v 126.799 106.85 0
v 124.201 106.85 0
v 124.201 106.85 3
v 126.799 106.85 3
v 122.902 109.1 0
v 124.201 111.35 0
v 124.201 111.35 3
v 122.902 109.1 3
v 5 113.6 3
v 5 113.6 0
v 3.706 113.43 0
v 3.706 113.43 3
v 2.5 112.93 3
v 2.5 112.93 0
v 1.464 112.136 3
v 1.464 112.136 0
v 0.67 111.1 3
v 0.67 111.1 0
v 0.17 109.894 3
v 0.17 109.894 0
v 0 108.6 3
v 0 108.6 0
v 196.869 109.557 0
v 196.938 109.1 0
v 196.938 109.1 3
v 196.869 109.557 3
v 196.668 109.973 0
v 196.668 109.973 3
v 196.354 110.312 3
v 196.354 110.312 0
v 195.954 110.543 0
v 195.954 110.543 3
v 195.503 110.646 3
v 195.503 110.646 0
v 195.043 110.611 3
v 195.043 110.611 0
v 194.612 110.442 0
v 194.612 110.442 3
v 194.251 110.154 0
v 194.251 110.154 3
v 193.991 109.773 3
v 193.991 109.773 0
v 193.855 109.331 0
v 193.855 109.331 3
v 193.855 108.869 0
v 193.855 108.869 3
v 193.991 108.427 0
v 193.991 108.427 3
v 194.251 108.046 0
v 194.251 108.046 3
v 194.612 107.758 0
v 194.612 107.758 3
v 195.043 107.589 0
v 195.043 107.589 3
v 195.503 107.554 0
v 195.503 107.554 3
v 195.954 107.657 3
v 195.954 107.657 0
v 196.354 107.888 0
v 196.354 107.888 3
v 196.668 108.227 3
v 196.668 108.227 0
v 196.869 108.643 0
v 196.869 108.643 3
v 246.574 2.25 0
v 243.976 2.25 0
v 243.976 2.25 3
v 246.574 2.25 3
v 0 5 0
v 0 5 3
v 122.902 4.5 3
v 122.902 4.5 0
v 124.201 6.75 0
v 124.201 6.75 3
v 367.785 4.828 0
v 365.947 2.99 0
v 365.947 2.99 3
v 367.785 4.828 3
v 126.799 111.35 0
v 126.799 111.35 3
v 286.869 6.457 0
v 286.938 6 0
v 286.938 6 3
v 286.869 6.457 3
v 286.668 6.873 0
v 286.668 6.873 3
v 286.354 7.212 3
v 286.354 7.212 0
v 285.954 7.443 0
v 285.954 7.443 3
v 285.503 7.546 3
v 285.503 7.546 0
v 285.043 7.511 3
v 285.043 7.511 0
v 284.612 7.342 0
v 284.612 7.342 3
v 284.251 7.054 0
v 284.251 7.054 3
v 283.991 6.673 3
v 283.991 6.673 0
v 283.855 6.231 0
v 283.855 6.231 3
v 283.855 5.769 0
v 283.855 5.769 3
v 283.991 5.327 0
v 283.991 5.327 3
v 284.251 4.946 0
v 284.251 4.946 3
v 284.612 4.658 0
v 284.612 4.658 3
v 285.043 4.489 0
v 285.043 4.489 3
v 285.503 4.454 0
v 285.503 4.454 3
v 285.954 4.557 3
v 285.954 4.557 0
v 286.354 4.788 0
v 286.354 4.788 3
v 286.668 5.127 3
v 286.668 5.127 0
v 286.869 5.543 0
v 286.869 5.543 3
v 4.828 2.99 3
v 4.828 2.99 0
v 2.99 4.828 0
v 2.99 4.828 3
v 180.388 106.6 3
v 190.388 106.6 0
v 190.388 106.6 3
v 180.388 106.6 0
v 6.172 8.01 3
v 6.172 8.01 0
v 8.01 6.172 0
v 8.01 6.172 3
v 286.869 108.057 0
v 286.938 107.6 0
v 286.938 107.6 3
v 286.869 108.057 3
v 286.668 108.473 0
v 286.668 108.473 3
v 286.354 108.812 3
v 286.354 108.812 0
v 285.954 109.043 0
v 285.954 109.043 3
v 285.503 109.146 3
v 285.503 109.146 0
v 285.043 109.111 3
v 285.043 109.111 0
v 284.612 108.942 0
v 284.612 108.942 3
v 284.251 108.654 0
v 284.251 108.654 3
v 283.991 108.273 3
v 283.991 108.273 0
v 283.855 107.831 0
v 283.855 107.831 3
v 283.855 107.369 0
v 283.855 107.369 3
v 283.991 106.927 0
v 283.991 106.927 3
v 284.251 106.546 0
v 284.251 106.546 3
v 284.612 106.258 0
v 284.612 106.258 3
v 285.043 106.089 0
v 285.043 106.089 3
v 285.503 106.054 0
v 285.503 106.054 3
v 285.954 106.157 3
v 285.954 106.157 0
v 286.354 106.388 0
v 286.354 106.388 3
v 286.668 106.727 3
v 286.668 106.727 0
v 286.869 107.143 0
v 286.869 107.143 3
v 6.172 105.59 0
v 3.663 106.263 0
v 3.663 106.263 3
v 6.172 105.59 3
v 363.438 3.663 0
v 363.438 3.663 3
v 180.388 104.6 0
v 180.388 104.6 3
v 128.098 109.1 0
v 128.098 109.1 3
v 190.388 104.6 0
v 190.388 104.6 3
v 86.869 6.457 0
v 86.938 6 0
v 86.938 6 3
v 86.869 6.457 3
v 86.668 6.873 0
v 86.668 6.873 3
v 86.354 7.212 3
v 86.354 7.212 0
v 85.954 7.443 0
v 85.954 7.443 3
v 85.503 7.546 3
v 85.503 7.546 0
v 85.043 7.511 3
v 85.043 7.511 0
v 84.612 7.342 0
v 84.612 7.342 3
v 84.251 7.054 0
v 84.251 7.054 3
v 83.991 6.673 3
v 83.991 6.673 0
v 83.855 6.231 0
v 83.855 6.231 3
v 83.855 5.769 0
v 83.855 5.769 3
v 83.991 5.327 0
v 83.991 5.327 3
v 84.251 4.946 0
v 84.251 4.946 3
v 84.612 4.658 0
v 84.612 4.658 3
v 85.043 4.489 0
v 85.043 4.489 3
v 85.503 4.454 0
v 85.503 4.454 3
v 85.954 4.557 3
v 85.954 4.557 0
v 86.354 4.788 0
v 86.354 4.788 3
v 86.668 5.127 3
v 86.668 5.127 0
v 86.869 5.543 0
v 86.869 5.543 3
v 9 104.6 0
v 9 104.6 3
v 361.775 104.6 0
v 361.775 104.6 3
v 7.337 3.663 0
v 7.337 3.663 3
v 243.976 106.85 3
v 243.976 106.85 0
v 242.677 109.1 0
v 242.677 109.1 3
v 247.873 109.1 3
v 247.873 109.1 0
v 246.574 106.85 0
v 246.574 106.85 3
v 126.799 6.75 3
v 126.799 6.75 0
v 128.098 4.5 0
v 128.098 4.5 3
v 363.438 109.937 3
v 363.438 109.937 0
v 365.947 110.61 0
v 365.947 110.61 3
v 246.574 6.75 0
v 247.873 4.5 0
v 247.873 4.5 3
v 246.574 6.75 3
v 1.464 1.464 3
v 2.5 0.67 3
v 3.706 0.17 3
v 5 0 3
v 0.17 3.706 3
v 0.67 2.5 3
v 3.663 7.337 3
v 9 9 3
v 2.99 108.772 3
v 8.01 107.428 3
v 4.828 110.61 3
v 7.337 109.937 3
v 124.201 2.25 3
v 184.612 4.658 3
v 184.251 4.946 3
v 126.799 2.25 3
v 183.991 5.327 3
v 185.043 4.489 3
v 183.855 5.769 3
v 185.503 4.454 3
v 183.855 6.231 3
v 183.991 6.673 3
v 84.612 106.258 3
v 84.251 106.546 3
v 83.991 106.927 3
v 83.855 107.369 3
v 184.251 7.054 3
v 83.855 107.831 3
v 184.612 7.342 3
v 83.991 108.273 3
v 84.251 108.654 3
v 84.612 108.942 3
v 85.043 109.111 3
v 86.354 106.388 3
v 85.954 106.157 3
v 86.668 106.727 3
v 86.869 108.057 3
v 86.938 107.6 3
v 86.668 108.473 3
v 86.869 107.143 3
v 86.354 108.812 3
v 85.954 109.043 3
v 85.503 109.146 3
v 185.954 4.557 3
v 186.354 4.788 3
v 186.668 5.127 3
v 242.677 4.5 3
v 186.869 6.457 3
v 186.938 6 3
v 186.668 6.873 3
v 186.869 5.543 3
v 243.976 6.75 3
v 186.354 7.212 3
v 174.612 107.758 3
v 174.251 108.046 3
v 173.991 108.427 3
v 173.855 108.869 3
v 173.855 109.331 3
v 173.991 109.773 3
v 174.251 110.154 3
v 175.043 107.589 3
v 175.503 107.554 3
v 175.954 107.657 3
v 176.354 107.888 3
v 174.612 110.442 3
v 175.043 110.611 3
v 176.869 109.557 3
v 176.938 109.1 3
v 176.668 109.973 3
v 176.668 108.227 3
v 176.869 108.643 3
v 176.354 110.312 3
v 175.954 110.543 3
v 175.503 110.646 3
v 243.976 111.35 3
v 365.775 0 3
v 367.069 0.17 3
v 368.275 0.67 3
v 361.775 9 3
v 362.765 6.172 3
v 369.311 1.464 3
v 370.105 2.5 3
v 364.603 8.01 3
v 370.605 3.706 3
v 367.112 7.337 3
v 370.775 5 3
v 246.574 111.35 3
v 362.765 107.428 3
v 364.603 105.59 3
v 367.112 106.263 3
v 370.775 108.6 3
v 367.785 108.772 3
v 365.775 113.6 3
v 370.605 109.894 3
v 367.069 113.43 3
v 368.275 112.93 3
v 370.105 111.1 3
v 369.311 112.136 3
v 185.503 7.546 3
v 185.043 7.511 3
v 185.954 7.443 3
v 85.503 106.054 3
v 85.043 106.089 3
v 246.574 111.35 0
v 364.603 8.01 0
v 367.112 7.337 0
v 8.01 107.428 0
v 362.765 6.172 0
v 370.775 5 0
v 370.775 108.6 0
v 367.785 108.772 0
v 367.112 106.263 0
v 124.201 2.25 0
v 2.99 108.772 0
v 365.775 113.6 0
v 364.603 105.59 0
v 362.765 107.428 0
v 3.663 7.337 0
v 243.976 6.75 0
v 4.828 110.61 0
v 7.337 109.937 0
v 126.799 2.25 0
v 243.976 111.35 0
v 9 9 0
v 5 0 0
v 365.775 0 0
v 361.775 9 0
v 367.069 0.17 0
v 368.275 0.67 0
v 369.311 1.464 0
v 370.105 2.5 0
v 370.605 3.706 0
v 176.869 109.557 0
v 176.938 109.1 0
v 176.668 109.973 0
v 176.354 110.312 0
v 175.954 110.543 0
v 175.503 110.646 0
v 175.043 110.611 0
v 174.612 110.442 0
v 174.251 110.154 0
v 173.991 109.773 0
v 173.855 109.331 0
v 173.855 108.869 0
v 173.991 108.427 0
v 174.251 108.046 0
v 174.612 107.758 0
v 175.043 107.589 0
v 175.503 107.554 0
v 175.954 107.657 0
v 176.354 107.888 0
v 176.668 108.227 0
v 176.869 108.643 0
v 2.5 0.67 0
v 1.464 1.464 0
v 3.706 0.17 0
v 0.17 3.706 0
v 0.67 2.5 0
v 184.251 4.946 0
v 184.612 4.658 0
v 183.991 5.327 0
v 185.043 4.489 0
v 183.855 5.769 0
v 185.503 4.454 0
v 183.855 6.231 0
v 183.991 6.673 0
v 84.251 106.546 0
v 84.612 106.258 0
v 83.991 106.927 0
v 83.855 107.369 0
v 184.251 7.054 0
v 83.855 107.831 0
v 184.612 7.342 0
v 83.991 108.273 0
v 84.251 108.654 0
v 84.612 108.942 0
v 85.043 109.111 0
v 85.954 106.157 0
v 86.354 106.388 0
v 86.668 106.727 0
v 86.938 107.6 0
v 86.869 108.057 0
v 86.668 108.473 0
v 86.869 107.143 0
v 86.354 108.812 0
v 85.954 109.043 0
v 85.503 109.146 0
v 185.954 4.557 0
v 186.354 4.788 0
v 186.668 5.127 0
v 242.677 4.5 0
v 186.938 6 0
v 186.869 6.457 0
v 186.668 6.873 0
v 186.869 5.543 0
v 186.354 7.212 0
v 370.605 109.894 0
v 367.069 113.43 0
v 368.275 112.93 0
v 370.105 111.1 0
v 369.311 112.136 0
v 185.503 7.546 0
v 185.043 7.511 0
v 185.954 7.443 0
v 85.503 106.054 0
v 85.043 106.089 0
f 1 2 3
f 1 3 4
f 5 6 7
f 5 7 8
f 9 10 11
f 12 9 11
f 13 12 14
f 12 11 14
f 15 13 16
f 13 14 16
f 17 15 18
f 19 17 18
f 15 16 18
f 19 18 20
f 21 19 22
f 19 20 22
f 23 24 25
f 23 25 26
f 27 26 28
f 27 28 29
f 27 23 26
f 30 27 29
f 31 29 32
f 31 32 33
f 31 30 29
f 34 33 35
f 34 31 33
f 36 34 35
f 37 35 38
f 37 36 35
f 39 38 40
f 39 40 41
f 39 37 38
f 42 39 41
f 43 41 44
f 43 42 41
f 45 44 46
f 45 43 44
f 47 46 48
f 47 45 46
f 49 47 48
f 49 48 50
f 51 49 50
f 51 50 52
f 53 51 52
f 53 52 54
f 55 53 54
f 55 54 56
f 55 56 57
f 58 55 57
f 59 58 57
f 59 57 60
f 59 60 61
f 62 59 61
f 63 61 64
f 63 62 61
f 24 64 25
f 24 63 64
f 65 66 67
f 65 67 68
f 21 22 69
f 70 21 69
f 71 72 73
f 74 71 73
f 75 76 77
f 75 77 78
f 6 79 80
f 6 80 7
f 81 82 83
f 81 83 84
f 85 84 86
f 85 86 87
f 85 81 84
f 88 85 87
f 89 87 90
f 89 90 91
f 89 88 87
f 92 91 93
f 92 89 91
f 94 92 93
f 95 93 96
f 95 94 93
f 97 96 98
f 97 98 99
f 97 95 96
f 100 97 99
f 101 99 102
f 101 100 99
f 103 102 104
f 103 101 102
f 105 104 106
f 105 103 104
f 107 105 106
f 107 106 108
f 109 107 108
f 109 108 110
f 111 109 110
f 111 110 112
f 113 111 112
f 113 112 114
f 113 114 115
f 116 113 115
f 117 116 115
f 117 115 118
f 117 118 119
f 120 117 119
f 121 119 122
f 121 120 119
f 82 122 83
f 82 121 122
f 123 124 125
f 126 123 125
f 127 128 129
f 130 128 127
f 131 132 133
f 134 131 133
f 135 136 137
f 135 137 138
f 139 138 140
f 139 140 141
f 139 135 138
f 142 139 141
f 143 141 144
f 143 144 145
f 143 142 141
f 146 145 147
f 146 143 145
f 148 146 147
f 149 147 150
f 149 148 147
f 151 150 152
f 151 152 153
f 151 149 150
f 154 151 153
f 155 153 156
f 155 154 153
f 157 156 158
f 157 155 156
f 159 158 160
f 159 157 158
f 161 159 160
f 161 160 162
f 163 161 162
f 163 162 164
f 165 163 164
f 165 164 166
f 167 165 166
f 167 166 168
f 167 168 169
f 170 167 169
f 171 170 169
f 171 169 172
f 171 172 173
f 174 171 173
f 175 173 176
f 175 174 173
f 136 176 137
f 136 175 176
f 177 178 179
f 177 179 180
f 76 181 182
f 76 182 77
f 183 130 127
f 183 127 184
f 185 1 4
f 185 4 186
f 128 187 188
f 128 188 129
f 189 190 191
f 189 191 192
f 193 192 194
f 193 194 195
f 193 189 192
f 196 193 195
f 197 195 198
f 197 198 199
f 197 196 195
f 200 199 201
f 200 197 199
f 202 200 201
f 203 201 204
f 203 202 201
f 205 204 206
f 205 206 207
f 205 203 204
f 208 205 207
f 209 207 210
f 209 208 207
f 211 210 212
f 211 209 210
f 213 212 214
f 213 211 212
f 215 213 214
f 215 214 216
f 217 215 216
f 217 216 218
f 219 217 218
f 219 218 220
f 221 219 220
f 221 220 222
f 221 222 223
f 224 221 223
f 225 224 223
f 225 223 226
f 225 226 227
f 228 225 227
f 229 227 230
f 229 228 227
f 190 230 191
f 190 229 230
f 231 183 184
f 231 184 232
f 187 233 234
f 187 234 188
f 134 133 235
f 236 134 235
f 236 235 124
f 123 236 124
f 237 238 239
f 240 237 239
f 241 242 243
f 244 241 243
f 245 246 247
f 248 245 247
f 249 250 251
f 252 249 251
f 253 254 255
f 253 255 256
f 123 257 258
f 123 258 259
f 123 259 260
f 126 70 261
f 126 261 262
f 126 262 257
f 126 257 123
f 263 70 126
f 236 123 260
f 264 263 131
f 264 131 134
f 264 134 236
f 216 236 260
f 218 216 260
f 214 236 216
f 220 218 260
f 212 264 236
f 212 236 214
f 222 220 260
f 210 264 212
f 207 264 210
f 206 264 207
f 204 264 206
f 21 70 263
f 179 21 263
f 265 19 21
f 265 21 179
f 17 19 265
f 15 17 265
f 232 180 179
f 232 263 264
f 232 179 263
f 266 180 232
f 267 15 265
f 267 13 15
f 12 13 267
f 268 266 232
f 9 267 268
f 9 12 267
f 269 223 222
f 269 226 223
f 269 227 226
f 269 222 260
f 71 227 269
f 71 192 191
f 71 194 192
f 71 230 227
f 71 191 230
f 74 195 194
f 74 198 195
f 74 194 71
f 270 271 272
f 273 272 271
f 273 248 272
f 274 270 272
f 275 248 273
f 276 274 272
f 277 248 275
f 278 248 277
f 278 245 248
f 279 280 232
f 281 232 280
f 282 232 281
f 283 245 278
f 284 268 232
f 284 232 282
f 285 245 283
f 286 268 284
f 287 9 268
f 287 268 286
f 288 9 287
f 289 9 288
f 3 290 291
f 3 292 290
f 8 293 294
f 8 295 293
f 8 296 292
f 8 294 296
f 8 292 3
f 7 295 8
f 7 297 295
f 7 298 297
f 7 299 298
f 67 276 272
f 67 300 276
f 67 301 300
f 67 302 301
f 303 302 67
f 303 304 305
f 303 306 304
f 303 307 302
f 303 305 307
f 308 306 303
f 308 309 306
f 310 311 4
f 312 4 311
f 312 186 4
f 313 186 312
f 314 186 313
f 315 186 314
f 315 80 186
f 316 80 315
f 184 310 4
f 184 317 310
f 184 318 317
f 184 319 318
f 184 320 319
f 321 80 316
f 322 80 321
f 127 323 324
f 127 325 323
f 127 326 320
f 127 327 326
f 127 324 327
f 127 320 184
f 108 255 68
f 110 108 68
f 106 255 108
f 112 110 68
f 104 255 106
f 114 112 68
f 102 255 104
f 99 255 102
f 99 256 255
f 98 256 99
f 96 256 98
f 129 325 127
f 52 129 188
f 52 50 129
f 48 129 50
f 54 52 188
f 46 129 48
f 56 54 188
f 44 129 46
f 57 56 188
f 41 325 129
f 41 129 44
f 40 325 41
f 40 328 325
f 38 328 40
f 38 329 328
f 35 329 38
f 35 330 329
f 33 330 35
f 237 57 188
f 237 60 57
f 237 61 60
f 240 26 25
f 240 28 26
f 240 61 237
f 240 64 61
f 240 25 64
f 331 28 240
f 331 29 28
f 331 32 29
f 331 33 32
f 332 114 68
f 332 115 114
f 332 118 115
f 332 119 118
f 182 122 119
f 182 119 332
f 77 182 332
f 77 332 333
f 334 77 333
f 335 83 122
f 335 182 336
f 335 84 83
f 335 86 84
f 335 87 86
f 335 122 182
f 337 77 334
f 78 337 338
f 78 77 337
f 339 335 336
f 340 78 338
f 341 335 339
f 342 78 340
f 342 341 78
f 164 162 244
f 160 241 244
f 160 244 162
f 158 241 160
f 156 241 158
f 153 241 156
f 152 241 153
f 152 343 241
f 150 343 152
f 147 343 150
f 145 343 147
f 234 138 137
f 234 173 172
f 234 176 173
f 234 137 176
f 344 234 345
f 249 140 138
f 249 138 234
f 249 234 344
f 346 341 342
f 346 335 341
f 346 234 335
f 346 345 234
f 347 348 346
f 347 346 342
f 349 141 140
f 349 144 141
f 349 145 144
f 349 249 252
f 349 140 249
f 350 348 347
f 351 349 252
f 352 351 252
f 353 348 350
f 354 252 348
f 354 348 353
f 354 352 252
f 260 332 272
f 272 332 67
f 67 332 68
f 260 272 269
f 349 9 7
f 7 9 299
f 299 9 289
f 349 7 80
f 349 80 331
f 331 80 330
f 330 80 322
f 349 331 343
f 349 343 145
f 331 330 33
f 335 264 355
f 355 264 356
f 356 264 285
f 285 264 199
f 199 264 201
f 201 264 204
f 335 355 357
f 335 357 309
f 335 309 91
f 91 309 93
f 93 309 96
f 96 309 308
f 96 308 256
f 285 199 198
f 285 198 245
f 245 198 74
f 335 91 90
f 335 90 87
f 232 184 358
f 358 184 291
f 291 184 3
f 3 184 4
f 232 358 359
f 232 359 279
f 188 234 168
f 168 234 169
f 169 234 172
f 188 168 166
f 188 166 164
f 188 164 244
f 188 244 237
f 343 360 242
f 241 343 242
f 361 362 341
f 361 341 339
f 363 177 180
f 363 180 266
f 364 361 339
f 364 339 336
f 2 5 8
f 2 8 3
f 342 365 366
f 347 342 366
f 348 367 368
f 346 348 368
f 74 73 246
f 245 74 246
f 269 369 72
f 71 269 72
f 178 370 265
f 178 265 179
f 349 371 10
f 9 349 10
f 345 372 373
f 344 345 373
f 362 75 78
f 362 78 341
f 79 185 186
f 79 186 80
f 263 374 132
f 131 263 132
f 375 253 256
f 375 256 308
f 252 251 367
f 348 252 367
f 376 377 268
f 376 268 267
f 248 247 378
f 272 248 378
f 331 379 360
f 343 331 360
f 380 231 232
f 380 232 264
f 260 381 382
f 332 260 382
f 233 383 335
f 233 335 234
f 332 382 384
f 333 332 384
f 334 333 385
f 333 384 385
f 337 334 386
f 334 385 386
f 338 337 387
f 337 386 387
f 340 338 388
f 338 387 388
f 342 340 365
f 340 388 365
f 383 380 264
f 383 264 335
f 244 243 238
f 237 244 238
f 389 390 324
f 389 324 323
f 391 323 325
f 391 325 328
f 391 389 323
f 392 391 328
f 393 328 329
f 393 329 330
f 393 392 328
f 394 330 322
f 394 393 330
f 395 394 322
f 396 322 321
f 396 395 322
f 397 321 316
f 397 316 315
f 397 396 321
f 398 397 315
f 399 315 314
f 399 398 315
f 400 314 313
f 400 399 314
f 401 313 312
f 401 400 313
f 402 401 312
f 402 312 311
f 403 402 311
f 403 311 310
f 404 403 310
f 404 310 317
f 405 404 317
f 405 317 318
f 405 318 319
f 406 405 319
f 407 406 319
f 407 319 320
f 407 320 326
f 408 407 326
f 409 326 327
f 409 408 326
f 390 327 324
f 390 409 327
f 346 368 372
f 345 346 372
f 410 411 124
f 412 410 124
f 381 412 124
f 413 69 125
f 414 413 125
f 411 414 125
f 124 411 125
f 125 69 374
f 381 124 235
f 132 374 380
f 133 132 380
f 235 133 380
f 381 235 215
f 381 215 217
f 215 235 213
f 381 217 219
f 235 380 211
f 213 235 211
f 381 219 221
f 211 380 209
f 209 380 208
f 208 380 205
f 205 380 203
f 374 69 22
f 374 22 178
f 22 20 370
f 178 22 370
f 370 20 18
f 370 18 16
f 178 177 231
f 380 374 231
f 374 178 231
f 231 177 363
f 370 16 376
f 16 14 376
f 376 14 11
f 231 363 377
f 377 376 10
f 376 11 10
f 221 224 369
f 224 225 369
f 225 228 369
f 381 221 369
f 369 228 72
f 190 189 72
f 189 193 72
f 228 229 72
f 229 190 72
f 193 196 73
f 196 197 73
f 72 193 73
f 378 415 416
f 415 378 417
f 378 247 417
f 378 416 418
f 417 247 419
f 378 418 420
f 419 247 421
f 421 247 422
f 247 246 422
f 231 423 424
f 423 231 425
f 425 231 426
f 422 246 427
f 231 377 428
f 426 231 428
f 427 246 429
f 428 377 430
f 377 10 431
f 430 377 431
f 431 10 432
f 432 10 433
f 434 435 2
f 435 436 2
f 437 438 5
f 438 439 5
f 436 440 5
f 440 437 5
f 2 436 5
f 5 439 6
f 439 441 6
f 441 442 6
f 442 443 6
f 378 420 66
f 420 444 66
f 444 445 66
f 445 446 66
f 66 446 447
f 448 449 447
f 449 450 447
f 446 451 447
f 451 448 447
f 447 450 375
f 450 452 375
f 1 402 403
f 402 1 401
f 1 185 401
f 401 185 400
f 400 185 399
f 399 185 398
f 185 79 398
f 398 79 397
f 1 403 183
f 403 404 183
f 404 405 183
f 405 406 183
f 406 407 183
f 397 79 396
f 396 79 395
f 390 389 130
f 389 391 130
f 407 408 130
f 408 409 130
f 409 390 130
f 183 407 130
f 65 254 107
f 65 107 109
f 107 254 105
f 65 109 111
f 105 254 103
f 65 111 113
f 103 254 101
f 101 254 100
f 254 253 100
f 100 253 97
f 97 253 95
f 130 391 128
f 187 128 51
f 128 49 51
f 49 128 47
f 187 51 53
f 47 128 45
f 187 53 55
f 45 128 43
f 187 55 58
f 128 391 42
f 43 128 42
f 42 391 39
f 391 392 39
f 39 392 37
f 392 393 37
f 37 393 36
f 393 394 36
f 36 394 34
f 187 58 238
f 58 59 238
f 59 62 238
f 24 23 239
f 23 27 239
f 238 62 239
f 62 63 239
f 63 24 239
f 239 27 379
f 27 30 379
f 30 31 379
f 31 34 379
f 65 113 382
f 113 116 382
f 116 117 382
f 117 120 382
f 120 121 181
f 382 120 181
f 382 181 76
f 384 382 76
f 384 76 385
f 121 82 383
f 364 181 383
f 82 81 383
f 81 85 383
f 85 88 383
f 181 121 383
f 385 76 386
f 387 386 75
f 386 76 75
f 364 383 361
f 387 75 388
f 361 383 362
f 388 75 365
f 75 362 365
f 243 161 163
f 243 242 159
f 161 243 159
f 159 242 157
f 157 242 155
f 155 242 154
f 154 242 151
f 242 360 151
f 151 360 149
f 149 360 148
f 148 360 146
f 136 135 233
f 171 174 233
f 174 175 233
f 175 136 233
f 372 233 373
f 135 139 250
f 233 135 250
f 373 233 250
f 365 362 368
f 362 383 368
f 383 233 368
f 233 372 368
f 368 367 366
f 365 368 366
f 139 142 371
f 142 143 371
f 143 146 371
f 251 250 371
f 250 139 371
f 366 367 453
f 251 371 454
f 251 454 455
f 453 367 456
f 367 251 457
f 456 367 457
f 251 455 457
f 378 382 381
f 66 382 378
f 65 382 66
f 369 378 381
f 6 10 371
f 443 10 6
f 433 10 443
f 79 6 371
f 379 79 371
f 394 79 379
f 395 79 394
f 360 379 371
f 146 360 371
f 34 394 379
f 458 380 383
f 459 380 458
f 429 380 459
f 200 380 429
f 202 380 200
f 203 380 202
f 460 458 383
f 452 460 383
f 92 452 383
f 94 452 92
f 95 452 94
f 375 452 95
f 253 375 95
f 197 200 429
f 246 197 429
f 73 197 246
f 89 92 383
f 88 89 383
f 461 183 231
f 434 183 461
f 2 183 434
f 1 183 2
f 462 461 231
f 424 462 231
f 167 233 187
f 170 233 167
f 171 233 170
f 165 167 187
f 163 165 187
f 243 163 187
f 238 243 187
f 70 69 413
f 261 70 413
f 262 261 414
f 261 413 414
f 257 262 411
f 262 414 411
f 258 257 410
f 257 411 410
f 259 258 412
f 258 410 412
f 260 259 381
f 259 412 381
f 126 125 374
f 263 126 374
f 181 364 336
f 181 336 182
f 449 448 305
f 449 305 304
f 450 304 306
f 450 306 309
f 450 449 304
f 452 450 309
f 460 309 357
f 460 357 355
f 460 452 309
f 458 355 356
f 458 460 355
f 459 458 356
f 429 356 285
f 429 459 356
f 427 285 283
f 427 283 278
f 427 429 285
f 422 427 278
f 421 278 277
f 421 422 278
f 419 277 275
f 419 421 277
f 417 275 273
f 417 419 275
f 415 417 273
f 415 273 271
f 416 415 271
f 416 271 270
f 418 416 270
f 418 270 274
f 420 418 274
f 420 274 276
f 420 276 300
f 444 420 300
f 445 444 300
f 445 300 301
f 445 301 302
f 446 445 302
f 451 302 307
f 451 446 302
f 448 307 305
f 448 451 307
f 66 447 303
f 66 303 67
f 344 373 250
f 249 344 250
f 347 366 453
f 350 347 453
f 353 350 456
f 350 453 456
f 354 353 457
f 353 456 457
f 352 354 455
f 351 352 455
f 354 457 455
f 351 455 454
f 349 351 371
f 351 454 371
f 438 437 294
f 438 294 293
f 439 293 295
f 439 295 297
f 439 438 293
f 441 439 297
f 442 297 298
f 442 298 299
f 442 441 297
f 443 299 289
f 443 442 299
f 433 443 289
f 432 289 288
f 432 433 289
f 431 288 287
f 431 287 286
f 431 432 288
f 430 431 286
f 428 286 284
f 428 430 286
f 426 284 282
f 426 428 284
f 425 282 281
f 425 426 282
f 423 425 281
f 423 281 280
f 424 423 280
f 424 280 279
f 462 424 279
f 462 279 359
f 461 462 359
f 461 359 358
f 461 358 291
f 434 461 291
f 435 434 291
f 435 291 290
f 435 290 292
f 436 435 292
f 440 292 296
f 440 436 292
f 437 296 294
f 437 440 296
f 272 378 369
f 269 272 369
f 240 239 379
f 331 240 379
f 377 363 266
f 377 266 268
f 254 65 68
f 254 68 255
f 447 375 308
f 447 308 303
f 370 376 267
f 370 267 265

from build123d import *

# Parameters (mm, degrees)
MODEL_R             = 1.55
BOSS_EXTRUDE1_DEPTH = 3


with BuildPart() as part:
    # Model → Boss-Extrude1 (new body)
    with BuildSketch(Plane.XY):
        with BuildLine():
            Line((0, 108.6), (0, 5))
            ThreePointArc((0, 5), (1.464466094, 1.464466094), (5, 0))
            Line((5, 0), (365.775, 0))
            ThreePointArc((365.775, 0), (369.310533906, 1.464466094), (370.775, 5))
            Line((370.775, 5), (370.775, 108.6))
            ThreePointArc((370.775, 108.6), (369.310533906, 112.135533906), (365.775, 113.6))
            Line((365.775, 113.6), (5, 113.6))
            ThreePointArc((5, 113.6), (1.464466094, 112.135533906), (0, 108.6))
        make_face()
        with Locations((195.3875, 109.1)):
            Circle(MODEL_R, mode=Mode.SUBTRACT)
        with Locations((175.3875, 109.1)):
            Circle(MODEL_R, mode=Mode.SUBTRACT)
        with Locations((85.3875, 107.6)):
            Circle(MODEL_R, mode=Mode.SUBTRACT)
        with Locations((285.3875, 107.6)):
            Circle(MODEL_R, mode=Mode.SUBTRACT)
        with Locations((85.3875, 6)):
            Circle(MODEL_R, mode=Mode.SUBTRACT)
        with Locations((185.3875, 6)):
            Circle(MODEL_R, mode=Mode.SUBTRACT)
        with Locations((285.3875, 6)):
            Circle(MODEL_R, mode=Mode.SUBTRACT)
        Polygon((9, 9), (361.775, 9), (361.775, 104.6), (190.3875, 104.6), (190.3875, 106.6), (180.3875, 106.6), (180.3875, 104.6), (9, 104.6), align=None, mode=Mode.SUBTRACT)
        Polygon((365.947431604, 110.609548911), (367.784548911, 108.772431604), (367.112117307, 106.262882693), (364.602568396, 105.590451089), (362.765451089, 107.427568396), (363.437882693, 109.937117307), align=None, mode=Mode.SUBTRACT)
        Polygon((4.827568396, 110.609548911), (2.990451089, 108.772431604), (3.662882693, 106.262882693), (6.172431604, 105.590451089), (8.009548911, 107.427568396), (7.337117307, 109.937117307), align=None, mode=Mode.SUBTRACT)
        Polygon((365.947431604, 2.990451089), (367.784548911, 4.827568396), (367.112117307, 7.337117307), (364.602568396, 8.009548911), (362.765451089, 6.172431604), (363.437882693, 3.662882693), align=None, mode=Mode.SUBTRACT)
        Polygon((126.799038106, 2.25), (124.200961894, 2.25), (122.901923789, 4.5), (124.200961894, 6.75), (126.799038106, 6.75), (128.098076211, 4.5), align=None, mode=Mode.SUBTRACT)
        Polygon((4.827568396, 2.990451089), (2.990451089, 4.827568396), (3.662882693, 7.337117307), (6.172431604, 8.009548911), (8.009548911, 6.172431604), (7.337117307, 3.662882693), align=None, mode=Mode.SUBTRACT)
        Polygon((126.799038106, 111.35), (124.200961894, 111.35), (122.901923789, 109.1), (124.200961894, 106.85), (126.799038106, 106.85), (128.098076211, 109.1), align=None, mode=Mode.SUBTRACT)
        Polygon((243.975961894, 2.25), (246.574038106, 2.25), (247.873076211, 4.5), (246.574038106, 6.75), (243.975961894, 6.75), (242.676923789, 4.5), align=None, mode=Mode.SUBTRACT)
        Polygon((243.975961894, 111.35), (246.574038106, 111.35), (247.873076211, 109.1), (246.574038106, 106.85), (243.975961894, 106.85), (242.676923789, 109.1), align=None, mode=Mode.SUBTRACT)
    extrude(amount=BOSS_EXTRUDE1_DEPTH)


solid = part.part
